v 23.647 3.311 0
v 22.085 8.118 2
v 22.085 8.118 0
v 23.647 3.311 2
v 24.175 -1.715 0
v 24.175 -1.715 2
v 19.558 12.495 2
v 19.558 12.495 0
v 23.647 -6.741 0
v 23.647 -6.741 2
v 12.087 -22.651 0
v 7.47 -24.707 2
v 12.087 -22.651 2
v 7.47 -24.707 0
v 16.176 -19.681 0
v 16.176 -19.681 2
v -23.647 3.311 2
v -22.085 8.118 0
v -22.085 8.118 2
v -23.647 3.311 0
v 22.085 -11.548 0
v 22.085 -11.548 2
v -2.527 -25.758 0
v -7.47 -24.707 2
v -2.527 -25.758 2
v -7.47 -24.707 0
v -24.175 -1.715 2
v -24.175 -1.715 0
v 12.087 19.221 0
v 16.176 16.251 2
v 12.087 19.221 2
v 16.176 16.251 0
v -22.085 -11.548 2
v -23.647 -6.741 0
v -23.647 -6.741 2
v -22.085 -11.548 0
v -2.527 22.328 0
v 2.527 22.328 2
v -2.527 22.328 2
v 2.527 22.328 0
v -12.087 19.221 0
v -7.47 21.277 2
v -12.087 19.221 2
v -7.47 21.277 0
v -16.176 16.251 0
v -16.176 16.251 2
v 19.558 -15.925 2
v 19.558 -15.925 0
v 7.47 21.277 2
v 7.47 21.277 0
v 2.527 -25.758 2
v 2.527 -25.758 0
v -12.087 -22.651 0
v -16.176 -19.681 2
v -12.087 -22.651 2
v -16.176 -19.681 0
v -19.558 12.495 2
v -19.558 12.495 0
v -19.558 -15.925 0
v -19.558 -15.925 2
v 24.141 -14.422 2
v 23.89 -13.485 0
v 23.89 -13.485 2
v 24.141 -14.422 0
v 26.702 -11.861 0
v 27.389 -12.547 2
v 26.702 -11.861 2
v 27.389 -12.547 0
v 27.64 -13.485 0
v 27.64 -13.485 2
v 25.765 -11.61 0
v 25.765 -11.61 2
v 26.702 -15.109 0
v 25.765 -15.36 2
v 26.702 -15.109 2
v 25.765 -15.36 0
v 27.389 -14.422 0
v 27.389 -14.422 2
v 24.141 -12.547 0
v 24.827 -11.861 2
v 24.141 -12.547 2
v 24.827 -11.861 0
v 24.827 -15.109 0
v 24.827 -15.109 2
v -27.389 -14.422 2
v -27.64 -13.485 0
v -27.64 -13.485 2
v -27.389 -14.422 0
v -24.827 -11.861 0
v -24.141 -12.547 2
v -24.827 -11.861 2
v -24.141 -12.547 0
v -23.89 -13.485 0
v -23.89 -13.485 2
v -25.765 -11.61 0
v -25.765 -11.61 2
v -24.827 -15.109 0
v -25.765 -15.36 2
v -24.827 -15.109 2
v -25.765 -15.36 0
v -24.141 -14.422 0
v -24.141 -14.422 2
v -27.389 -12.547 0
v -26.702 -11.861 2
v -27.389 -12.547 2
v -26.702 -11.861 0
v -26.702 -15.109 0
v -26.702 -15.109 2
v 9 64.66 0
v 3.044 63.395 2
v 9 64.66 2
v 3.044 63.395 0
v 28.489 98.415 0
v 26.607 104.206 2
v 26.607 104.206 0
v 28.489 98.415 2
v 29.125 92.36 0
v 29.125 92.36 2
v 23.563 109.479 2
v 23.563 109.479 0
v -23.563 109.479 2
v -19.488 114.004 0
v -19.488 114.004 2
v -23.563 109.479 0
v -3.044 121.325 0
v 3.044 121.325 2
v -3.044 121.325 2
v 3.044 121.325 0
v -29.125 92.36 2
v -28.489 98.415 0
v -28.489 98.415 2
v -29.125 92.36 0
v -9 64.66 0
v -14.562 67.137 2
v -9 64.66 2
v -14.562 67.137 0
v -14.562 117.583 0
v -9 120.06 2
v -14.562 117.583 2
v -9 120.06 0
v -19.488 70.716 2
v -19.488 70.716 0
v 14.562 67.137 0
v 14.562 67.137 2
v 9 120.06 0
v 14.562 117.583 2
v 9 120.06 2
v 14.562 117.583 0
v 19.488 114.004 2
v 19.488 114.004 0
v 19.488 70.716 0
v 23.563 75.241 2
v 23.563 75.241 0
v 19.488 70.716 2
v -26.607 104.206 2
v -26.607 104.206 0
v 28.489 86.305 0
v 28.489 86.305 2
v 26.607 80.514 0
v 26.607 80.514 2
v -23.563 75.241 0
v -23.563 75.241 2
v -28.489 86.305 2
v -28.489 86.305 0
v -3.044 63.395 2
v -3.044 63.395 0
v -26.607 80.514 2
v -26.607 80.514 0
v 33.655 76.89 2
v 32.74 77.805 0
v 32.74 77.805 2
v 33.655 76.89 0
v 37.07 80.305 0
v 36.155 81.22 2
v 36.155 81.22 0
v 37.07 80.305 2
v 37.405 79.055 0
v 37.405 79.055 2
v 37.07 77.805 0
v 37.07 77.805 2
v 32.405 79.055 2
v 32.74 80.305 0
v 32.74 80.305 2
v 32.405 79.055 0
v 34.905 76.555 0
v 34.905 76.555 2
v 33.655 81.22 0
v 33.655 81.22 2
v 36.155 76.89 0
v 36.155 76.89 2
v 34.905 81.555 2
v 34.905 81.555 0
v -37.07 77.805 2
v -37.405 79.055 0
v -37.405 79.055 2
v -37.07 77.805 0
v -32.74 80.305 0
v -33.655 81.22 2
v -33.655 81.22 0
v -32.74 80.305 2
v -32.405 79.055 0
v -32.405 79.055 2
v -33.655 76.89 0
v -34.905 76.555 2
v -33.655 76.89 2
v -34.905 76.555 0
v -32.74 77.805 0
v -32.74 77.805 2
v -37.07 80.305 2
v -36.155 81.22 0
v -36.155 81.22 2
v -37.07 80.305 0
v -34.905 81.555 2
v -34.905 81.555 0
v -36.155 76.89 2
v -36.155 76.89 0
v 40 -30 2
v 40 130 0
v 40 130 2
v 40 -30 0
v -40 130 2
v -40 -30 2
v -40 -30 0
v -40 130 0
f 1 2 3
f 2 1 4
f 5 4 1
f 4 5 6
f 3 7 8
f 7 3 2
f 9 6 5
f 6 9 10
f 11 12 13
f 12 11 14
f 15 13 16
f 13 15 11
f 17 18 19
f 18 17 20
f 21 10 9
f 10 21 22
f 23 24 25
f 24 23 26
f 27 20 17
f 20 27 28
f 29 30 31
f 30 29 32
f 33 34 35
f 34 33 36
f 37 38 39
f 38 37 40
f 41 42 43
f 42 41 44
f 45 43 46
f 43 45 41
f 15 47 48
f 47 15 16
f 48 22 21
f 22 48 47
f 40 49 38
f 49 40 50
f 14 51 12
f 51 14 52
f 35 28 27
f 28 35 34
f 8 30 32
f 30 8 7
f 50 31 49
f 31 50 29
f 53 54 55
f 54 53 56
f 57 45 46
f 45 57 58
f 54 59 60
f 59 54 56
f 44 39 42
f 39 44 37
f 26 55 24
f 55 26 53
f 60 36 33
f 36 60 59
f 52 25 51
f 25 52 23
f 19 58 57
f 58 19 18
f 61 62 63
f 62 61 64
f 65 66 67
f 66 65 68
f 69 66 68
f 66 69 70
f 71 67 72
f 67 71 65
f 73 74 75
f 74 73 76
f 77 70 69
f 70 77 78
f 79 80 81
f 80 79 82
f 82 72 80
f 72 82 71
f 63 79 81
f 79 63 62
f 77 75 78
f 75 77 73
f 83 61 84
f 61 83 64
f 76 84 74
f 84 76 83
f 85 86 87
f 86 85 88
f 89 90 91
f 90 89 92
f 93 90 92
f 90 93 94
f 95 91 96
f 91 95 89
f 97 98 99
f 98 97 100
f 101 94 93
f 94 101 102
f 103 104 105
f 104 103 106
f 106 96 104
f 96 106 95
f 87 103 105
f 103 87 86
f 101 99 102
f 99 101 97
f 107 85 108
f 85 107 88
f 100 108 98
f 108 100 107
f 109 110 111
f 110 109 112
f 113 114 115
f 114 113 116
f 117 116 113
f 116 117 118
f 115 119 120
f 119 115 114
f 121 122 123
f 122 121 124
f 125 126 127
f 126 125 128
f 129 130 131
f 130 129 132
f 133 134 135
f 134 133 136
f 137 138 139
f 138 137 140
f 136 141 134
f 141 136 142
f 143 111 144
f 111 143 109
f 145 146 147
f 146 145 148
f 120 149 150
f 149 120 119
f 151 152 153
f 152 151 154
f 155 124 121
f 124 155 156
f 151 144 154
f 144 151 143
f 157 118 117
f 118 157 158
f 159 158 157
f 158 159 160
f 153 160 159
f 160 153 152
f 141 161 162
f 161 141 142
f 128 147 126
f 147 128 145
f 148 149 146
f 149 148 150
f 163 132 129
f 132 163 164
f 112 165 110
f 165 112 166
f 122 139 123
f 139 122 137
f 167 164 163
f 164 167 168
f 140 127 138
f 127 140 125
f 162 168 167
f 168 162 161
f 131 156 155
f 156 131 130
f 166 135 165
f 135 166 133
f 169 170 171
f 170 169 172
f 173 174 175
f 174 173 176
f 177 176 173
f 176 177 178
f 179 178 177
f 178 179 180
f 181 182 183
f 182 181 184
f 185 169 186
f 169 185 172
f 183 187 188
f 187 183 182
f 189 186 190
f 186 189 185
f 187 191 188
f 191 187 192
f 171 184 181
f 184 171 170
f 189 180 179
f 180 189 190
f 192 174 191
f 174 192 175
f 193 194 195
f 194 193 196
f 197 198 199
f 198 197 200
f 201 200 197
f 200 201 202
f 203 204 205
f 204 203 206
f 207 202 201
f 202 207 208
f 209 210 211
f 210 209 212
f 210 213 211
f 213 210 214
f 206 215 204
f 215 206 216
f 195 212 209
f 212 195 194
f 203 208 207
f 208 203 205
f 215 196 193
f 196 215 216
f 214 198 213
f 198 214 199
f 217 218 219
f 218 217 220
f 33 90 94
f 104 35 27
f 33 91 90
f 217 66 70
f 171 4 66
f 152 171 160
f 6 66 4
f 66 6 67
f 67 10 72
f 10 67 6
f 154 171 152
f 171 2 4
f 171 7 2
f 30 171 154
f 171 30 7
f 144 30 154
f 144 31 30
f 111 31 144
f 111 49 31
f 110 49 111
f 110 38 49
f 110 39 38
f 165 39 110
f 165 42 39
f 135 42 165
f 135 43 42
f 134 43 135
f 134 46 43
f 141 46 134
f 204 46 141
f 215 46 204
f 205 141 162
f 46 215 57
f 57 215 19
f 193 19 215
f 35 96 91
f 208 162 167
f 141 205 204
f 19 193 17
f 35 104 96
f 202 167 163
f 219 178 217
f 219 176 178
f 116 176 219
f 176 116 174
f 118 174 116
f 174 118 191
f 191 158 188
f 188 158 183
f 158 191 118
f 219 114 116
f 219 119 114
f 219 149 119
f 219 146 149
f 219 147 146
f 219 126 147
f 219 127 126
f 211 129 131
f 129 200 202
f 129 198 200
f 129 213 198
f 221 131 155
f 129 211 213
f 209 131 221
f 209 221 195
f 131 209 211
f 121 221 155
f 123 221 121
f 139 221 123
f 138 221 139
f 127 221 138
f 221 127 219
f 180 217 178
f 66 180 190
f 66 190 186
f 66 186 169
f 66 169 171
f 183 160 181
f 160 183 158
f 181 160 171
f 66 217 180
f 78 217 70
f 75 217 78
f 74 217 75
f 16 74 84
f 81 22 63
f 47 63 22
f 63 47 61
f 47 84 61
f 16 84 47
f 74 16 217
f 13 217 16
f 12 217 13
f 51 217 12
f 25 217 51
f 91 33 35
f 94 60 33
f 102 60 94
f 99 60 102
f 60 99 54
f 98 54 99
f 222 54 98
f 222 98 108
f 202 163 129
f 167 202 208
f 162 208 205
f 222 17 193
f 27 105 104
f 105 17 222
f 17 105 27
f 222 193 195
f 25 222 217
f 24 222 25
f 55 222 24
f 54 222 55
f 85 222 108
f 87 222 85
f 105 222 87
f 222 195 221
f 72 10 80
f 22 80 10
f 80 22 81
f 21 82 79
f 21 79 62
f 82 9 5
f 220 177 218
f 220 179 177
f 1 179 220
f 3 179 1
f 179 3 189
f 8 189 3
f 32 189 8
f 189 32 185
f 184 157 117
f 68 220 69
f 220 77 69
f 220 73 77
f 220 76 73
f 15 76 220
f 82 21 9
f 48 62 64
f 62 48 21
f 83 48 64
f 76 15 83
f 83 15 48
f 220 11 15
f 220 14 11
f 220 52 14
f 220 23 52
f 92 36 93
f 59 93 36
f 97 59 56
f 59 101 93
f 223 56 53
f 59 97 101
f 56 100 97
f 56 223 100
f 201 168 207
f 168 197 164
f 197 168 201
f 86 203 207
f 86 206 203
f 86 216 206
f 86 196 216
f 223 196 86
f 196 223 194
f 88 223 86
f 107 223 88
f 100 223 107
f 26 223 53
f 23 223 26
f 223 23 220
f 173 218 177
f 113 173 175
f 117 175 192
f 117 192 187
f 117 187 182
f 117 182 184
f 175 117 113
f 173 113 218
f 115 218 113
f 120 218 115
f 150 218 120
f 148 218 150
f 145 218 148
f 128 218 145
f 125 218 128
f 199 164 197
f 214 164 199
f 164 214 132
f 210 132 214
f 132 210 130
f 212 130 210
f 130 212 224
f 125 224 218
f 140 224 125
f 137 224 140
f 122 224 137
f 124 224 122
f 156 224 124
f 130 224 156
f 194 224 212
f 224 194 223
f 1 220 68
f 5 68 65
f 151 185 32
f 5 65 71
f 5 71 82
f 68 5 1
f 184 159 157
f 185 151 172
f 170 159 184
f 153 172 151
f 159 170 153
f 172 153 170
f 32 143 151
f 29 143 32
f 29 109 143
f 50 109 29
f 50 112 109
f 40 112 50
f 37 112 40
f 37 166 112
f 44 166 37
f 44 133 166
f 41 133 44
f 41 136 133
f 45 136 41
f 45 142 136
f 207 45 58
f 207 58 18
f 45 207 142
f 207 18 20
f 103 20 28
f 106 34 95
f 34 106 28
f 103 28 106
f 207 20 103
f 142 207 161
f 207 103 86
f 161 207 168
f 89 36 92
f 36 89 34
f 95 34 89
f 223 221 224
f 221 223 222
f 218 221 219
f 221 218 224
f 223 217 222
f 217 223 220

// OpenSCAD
//
//  I picked up some analog panel meters.  There are two different sizes.  This file
//  provides models and panel cutouts for both sizes.
//
//
//  This is the smaller sized meter.  The meter model can be used to give an idea of conflicts
//  with other objects.  The cutout model is used to make holes in a panel for mounting the
//  meter.
//
module bbs_meter_1()
{
  width = 64.28;
  height = 56.24;
  screw = 2.75/2;
  translate([-width/2, -height/2, -10.55]) cube([width, height, 10.55]);
  translate([0, 1.98-(height-47.85)/2, 0]) cylinder(r=47.85/2, h=3.02);
  translate([0, 1.98-(height-25.06)/2, 0]) scale([38.02/25.06, 1, 1])cylinder(r=25.06/2, h=37.12 + 8.23);
  translate([(width/2 - 4.5 - screw), -(height/2 - 12.76 - screw), 0]) cylinder(r=screw, h=9.45, $fn=12);
  translate([-(width/2 - 4.5 - screw), -(height/2 - 12.76 - screw), 0]) cylinder(r=screw, h=9.45, $fn=12);
}

module bbs_meter_1_cutout(depth)
{
  width = 64.28;
  height = 56.24;
  screw = 3.75/2;
  translate([0, 2.48-(height-47.85)/2, -0.1]) cylinder(r=48.35/2, h=depth);
  translate([(width/2 - 4.5 - screw), -(height/2 - 12.76 - screw), -0.1]) cylinder(r=screw, h=depth, $fn=12);
  translate([-(width/2 - 4.5 - screw), -(height/2 - 12.76 - screw), -0.1]) cylinder(r=screw, h=depth, $fn=12);
}
//
//  This is the larger sized meter.  The meter model can be used to give an idea of conflicts
//  with other objects.  The cutout model is used to make holes in a panel for mounting the
//  meter.
//
module bbs_meter_2()
{
  width = 99.81;
  height = 79.35;
  screw = 4/2;
  translate([-width/2, -height/2, -10.55]) cube([width, height, 10.55]);
  translate([0, 2.66-(height-57.75)/2, 0]) cylinder(r=57.75/2, h=3.02);
  translate([0, 8.10-(height-25.06)/2, 0]) scale([39.40/25.06, 1, 1])cylinder(r=25.06/2, h=37.12 + 8.23);
  translate([(width/2 - 12.5 - screw), -(height/2 - 16.23 - screw), 0]) cylinder(r=screw, h=9.45, $fn=12);
  translate([-(width/2 - 12.5 - screw), -(height/2 - 16.23 - screw), 0]) cylinder(r=screw, h=9.45, $fn=12);
}

module bbs_meter_2_cutout(depth)
{
  width = 99.81;
  height = 79.35;
  screw = 5/2;
  translate([0, 3.16-(height-57.75)/2, -0.1]) cylinder(r=58.25/2, h=depth);
  translate([(width/2 - 12.5 - screw), -(height/2 - 16.23 - screw), -0.1]) cylinder(r=screw, h=depth, $fn=12);
  translate([-(width/2 - 12.5 - screw), -(height/2 - 16.23 - screw), -0.1])
    cylinder(r=screw, h=depth, $fn=12);
}

module test()
{
  difference()
  {
    translate([-40, -30, 0]) cube([80, 160, 2]);
    union()
    {
      translate([0, 0, -0.1]) bbs_meter_1_cutout(3);
      translate([0, 100, -0.1]) bbs_meter_2_cutout(3);
    }
  }
}

test();

//bbs_meter_2();
